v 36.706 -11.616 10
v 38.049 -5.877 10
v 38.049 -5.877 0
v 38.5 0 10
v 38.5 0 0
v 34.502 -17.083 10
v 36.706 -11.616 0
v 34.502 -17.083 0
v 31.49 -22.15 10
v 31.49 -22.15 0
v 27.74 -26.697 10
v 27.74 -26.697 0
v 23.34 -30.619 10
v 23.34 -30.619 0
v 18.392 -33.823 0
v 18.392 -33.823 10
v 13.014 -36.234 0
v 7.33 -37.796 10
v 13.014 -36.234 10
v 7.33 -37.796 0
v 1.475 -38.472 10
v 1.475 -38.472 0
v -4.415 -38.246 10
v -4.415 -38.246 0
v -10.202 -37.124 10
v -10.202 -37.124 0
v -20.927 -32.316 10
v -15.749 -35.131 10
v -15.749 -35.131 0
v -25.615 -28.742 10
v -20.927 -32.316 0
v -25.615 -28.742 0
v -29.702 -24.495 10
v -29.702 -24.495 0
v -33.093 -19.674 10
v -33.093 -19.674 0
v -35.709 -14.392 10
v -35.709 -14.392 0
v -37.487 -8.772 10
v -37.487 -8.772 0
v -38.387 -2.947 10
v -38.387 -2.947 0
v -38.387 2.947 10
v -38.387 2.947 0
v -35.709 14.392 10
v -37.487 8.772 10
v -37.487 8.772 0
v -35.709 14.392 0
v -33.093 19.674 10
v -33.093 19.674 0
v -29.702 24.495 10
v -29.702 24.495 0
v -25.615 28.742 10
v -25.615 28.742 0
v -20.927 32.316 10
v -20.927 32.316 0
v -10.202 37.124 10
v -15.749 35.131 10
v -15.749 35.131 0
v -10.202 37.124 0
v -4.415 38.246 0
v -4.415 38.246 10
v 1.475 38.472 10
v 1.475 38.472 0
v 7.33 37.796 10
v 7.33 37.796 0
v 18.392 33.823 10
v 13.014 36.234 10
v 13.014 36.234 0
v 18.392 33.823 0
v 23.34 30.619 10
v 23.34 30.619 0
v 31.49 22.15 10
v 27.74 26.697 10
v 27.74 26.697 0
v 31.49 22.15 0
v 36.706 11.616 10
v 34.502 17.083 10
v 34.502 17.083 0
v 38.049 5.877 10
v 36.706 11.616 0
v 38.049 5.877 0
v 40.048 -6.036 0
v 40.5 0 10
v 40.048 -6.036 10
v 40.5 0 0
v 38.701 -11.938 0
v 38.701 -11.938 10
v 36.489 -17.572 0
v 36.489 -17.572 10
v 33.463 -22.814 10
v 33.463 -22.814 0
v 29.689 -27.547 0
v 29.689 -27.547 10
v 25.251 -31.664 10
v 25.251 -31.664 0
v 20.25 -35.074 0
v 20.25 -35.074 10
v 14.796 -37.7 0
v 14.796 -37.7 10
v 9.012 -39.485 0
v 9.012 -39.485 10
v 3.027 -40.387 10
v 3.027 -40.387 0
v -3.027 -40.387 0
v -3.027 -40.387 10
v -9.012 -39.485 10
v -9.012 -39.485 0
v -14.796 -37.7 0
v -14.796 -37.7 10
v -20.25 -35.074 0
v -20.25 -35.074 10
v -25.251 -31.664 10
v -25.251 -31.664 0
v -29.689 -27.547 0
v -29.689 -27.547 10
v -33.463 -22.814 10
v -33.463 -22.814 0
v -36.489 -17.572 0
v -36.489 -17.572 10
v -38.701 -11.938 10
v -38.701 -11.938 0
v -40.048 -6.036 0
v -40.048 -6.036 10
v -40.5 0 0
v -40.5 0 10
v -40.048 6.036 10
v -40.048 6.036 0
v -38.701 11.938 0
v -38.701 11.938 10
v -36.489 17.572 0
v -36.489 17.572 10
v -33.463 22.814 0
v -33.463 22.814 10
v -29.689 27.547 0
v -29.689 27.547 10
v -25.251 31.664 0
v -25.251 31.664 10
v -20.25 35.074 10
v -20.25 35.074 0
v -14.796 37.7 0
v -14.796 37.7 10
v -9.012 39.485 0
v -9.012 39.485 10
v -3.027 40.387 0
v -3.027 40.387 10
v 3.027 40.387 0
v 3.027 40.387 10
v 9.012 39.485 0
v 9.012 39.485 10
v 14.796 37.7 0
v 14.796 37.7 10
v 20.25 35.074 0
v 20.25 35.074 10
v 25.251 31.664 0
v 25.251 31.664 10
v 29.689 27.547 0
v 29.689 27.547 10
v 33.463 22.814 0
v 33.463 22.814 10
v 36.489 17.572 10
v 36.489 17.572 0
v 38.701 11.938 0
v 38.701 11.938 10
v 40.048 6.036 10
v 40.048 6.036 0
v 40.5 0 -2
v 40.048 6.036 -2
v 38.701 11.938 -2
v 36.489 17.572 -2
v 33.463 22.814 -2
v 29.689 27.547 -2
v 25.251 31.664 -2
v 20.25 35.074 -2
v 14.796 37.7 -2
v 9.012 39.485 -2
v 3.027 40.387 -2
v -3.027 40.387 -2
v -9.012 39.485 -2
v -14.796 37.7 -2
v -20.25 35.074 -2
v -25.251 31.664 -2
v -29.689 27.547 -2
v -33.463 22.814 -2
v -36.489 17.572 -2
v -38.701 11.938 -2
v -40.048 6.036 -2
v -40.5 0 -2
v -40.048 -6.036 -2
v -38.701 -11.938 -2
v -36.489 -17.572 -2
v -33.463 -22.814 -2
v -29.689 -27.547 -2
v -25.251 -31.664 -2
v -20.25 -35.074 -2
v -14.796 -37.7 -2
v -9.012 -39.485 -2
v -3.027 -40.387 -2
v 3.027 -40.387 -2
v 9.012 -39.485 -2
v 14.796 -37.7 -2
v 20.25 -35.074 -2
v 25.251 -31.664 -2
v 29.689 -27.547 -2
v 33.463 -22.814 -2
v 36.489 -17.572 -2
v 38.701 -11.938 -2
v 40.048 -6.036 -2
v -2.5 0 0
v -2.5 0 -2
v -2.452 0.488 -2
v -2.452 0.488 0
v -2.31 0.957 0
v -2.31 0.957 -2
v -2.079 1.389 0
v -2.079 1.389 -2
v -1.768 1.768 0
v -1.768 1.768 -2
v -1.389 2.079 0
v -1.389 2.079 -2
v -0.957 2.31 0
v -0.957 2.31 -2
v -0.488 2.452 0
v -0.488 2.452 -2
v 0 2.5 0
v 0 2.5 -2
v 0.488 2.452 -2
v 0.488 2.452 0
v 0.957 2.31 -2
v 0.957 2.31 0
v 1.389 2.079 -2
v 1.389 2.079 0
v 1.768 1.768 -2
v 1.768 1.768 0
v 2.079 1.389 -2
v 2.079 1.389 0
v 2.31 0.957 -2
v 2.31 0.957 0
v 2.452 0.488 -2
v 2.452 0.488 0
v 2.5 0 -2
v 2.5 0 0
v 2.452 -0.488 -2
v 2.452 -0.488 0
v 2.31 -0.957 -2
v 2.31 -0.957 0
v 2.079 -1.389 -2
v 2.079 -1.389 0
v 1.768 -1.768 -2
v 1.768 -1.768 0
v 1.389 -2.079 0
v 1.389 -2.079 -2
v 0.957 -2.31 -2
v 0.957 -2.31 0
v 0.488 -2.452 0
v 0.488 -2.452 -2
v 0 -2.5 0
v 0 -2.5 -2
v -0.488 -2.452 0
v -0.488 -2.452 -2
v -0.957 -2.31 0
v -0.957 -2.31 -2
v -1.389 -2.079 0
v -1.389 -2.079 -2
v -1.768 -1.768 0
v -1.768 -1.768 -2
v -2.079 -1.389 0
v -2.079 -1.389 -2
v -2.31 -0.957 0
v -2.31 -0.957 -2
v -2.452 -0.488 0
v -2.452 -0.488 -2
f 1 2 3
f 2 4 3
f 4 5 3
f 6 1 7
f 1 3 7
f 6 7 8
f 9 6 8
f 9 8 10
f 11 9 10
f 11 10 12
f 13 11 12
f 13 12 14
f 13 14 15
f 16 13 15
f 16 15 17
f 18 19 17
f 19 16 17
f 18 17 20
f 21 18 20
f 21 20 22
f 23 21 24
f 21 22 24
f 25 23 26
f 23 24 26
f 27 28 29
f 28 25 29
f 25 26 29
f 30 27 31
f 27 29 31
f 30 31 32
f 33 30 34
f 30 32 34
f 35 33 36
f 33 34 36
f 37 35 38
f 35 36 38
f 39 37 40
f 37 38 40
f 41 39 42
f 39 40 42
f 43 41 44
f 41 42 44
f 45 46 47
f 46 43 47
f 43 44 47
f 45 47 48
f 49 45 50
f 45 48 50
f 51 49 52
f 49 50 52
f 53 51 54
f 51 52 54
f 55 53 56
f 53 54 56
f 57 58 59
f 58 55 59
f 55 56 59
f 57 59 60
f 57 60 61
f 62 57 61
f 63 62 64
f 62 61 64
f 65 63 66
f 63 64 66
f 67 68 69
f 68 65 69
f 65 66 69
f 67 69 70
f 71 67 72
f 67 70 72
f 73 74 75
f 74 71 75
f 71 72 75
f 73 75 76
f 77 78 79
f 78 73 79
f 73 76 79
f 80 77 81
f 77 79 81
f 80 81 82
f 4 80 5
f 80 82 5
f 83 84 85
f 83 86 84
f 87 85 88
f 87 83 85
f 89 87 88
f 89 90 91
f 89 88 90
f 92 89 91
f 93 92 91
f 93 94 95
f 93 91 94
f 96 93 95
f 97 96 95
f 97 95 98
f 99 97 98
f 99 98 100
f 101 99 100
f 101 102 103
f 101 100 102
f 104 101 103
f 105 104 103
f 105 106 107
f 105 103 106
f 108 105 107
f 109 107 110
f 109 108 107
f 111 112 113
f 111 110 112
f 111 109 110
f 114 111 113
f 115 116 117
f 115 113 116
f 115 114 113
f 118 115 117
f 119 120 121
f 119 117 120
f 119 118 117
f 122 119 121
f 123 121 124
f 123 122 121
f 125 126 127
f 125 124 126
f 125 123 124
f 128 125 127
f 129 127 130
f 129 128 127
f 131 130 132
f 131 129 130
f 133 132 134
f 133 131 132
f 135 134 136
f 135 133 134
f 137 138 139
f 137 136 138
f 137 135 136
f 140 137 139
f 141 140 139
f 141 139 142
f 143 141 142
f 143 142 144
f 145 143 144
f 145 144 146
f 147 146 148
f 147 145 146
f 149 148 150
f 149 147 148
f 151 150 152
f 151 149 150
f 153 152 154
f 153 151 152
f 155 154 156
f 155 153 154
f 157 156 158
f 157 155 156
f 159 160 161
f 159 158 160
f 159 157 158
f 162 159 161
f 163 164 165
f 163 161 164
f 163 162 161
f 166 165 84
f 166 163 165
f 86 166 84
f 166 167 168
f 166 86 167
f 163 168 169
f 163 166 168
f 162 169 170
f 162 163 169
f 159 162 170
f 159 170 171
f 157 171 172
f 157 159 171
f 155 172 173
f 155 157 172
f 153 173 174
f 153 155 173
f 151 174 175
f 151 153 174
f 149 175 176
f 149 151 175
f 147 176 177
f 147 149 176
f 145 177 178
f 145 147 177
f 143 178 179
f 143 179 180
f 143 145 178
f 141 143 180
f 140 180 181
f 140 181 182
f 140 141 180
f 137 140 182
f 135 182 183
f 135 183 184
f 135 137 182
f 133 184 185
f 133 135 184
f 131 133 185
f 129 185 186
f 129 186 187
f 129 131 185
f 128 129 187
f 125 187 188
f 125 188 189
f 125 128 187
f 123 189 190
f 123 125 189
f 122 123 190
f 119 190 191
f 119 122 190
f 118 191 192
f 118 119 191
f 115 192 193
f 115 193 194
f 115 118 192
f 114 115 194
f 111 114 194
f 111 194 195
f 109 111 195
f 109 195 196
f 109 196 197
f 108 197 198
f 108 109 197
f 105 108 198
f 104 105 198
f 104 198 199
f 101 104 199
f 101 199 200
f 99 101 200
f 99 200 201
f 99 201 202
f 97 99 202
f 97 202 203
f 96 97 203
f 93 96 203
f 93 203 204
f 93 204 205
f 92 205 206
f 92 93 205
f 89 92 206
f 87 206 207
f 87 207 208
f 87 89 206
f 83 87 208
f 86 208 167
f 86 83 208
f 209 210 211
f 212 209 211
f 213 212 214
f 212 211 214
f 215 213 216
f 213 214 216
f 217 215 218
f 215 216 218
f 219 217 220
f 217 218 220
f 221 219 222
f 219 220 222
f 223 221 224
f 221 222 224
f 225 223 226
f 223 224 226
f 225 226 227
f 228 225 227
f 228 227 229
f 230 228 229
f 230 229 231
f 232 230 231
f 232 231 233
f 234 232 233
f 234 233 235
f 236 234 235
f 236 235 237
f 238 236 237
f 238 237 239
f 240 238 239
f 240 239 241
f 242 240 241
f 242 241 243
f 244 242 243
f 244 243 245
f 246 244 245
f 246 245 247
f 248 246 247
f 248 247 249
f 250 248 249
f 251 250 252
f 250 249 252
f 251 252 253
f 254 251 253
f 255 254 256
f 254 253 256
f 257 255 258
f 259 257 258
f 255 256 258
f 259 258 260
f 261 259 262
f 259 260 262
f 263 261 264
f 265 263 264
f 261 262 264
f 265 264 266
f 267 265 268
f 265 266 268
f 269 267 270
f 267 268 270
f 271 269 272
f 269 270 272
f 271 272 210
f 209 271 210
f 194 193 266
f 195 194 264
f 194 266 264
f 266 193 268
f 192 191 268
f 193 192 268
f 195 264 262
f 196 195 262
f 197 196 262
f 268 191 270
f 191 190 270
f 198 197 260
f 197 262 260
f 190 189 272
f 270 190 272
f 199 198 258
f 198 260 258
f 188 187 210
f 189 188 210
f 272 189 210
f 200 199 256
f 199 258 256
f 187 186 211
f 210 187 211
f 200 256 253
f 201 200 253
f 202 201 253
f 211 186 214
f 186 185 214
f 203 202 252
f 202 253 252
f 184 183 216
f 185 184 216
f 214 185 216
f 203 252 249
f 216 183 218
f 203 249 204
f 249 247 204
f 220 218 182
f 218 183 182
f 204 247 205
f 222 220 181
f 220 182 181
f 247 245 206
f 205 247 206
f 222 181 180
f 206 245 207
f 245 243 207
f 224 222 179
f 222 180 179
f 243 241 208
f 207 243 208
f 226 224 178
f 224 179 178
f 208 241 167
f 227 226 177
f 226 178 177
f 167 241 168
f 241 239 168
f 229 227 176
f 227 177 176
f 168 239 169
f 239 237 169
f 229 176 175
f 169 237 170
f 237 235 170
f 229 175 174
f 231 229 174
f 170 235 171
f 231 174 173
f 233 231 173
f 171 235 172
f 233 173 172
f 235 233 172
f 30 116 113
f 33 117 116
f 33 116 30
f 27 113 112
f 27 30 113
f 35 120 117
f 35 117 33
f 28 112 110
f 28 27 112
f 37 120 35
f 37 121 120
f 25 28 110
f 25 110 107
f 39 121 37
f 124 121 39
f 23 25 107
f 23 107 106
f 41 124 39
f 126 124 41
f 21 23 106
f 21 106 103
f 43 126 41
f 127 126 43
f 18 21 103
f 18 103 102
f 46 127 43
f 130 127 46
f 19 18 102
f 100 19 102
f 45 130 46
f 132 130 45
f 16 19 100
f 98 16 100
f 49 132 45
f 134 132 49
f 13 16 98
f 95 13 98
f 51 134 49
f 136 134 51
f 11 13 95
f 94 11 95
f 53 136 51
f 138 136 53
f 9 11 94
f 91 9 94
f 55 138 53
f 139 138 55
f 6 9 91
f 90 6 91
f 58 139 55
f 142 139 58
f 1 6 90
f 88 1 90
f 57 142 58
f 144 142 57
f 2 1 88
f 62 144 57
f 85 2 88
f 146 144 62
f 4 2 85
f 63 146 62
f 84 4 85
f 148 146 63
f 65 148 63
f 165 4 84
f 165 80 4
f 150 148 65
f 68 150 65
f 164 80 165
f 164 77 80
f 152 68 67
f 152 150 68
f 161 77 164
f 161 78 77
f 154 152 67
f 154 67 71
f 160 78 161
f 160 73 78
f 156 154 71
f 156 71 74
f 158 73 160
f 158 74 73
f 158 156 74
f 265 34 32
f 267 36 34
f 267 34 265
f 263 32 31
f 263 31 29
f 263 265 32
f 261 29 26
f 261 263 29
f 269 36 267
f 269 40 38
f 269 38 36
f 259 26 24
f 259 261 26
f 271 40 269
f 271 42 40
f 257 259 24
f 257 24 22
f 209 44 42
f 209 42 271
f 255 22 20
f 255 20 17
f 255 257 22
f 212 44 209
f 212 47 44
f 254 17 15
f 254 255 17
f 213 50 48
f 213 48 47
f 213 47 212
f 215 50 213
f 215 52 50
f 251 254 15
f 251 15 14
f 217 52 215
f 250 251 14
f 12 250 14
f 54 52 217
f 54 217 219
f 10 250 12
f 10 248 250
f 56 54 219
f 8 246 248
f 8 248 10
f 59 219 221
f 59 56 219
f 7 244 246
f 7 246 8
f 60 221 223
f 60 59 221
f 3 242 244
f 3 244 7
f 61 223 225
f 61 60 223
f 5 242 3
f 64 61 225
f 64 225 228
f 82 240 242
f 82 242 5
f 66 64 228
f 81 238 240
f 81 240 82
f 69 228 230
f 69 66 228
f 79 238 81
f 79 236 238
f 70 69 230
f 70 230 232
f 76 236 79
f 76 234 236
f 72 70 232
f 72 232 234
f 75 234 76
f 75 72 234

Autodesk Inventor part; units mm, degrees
ref_plane "YZ Plane" through (0, 0, 0) normal (1, 0, 0) x (0, 1, 0)
ref_plane "XZ Plane" through (0, 0, 0) normal (0, 1, 0) x (-1, 0, 0)
ref_plane "XY Plane" through (0, 0, 0) normal (0, 0, 1) x (1, 0, 0)
sketch "Sketch1" plane through (0, 0, 0) normal (0, 0, 1) x (1, 0, 0)
  circle A0 centre (0, 0) radius 38.5
  circle A1 centre (0, 0) radius 40.5
  dimension "Inner_Diameter" = 77
  dimension "d1" = 81
extrude "Extrusion1" add sketch "Sketch1" against normal blind 2 contours A0 | A1
extrude "Extrusion2" add sketch "Sketch1" along normal blind 10
sketch "Sketch2" plane through (0, 0, -2) normal (0, 0, -1) x (-1, 0, 0)
  circle A0 centre (0, 0) radius 2.5
  dimension "Axis_Hole" = 5
extrude "Extrusion3" cut sketch "Sketch2" against normal up to surface (2 mm away) from surface at 0
equation "\"d1\" = Inner_Diameter + 2 * Thickness"
equation "\"Thickness\" = 2"
properties part number "Cap"
